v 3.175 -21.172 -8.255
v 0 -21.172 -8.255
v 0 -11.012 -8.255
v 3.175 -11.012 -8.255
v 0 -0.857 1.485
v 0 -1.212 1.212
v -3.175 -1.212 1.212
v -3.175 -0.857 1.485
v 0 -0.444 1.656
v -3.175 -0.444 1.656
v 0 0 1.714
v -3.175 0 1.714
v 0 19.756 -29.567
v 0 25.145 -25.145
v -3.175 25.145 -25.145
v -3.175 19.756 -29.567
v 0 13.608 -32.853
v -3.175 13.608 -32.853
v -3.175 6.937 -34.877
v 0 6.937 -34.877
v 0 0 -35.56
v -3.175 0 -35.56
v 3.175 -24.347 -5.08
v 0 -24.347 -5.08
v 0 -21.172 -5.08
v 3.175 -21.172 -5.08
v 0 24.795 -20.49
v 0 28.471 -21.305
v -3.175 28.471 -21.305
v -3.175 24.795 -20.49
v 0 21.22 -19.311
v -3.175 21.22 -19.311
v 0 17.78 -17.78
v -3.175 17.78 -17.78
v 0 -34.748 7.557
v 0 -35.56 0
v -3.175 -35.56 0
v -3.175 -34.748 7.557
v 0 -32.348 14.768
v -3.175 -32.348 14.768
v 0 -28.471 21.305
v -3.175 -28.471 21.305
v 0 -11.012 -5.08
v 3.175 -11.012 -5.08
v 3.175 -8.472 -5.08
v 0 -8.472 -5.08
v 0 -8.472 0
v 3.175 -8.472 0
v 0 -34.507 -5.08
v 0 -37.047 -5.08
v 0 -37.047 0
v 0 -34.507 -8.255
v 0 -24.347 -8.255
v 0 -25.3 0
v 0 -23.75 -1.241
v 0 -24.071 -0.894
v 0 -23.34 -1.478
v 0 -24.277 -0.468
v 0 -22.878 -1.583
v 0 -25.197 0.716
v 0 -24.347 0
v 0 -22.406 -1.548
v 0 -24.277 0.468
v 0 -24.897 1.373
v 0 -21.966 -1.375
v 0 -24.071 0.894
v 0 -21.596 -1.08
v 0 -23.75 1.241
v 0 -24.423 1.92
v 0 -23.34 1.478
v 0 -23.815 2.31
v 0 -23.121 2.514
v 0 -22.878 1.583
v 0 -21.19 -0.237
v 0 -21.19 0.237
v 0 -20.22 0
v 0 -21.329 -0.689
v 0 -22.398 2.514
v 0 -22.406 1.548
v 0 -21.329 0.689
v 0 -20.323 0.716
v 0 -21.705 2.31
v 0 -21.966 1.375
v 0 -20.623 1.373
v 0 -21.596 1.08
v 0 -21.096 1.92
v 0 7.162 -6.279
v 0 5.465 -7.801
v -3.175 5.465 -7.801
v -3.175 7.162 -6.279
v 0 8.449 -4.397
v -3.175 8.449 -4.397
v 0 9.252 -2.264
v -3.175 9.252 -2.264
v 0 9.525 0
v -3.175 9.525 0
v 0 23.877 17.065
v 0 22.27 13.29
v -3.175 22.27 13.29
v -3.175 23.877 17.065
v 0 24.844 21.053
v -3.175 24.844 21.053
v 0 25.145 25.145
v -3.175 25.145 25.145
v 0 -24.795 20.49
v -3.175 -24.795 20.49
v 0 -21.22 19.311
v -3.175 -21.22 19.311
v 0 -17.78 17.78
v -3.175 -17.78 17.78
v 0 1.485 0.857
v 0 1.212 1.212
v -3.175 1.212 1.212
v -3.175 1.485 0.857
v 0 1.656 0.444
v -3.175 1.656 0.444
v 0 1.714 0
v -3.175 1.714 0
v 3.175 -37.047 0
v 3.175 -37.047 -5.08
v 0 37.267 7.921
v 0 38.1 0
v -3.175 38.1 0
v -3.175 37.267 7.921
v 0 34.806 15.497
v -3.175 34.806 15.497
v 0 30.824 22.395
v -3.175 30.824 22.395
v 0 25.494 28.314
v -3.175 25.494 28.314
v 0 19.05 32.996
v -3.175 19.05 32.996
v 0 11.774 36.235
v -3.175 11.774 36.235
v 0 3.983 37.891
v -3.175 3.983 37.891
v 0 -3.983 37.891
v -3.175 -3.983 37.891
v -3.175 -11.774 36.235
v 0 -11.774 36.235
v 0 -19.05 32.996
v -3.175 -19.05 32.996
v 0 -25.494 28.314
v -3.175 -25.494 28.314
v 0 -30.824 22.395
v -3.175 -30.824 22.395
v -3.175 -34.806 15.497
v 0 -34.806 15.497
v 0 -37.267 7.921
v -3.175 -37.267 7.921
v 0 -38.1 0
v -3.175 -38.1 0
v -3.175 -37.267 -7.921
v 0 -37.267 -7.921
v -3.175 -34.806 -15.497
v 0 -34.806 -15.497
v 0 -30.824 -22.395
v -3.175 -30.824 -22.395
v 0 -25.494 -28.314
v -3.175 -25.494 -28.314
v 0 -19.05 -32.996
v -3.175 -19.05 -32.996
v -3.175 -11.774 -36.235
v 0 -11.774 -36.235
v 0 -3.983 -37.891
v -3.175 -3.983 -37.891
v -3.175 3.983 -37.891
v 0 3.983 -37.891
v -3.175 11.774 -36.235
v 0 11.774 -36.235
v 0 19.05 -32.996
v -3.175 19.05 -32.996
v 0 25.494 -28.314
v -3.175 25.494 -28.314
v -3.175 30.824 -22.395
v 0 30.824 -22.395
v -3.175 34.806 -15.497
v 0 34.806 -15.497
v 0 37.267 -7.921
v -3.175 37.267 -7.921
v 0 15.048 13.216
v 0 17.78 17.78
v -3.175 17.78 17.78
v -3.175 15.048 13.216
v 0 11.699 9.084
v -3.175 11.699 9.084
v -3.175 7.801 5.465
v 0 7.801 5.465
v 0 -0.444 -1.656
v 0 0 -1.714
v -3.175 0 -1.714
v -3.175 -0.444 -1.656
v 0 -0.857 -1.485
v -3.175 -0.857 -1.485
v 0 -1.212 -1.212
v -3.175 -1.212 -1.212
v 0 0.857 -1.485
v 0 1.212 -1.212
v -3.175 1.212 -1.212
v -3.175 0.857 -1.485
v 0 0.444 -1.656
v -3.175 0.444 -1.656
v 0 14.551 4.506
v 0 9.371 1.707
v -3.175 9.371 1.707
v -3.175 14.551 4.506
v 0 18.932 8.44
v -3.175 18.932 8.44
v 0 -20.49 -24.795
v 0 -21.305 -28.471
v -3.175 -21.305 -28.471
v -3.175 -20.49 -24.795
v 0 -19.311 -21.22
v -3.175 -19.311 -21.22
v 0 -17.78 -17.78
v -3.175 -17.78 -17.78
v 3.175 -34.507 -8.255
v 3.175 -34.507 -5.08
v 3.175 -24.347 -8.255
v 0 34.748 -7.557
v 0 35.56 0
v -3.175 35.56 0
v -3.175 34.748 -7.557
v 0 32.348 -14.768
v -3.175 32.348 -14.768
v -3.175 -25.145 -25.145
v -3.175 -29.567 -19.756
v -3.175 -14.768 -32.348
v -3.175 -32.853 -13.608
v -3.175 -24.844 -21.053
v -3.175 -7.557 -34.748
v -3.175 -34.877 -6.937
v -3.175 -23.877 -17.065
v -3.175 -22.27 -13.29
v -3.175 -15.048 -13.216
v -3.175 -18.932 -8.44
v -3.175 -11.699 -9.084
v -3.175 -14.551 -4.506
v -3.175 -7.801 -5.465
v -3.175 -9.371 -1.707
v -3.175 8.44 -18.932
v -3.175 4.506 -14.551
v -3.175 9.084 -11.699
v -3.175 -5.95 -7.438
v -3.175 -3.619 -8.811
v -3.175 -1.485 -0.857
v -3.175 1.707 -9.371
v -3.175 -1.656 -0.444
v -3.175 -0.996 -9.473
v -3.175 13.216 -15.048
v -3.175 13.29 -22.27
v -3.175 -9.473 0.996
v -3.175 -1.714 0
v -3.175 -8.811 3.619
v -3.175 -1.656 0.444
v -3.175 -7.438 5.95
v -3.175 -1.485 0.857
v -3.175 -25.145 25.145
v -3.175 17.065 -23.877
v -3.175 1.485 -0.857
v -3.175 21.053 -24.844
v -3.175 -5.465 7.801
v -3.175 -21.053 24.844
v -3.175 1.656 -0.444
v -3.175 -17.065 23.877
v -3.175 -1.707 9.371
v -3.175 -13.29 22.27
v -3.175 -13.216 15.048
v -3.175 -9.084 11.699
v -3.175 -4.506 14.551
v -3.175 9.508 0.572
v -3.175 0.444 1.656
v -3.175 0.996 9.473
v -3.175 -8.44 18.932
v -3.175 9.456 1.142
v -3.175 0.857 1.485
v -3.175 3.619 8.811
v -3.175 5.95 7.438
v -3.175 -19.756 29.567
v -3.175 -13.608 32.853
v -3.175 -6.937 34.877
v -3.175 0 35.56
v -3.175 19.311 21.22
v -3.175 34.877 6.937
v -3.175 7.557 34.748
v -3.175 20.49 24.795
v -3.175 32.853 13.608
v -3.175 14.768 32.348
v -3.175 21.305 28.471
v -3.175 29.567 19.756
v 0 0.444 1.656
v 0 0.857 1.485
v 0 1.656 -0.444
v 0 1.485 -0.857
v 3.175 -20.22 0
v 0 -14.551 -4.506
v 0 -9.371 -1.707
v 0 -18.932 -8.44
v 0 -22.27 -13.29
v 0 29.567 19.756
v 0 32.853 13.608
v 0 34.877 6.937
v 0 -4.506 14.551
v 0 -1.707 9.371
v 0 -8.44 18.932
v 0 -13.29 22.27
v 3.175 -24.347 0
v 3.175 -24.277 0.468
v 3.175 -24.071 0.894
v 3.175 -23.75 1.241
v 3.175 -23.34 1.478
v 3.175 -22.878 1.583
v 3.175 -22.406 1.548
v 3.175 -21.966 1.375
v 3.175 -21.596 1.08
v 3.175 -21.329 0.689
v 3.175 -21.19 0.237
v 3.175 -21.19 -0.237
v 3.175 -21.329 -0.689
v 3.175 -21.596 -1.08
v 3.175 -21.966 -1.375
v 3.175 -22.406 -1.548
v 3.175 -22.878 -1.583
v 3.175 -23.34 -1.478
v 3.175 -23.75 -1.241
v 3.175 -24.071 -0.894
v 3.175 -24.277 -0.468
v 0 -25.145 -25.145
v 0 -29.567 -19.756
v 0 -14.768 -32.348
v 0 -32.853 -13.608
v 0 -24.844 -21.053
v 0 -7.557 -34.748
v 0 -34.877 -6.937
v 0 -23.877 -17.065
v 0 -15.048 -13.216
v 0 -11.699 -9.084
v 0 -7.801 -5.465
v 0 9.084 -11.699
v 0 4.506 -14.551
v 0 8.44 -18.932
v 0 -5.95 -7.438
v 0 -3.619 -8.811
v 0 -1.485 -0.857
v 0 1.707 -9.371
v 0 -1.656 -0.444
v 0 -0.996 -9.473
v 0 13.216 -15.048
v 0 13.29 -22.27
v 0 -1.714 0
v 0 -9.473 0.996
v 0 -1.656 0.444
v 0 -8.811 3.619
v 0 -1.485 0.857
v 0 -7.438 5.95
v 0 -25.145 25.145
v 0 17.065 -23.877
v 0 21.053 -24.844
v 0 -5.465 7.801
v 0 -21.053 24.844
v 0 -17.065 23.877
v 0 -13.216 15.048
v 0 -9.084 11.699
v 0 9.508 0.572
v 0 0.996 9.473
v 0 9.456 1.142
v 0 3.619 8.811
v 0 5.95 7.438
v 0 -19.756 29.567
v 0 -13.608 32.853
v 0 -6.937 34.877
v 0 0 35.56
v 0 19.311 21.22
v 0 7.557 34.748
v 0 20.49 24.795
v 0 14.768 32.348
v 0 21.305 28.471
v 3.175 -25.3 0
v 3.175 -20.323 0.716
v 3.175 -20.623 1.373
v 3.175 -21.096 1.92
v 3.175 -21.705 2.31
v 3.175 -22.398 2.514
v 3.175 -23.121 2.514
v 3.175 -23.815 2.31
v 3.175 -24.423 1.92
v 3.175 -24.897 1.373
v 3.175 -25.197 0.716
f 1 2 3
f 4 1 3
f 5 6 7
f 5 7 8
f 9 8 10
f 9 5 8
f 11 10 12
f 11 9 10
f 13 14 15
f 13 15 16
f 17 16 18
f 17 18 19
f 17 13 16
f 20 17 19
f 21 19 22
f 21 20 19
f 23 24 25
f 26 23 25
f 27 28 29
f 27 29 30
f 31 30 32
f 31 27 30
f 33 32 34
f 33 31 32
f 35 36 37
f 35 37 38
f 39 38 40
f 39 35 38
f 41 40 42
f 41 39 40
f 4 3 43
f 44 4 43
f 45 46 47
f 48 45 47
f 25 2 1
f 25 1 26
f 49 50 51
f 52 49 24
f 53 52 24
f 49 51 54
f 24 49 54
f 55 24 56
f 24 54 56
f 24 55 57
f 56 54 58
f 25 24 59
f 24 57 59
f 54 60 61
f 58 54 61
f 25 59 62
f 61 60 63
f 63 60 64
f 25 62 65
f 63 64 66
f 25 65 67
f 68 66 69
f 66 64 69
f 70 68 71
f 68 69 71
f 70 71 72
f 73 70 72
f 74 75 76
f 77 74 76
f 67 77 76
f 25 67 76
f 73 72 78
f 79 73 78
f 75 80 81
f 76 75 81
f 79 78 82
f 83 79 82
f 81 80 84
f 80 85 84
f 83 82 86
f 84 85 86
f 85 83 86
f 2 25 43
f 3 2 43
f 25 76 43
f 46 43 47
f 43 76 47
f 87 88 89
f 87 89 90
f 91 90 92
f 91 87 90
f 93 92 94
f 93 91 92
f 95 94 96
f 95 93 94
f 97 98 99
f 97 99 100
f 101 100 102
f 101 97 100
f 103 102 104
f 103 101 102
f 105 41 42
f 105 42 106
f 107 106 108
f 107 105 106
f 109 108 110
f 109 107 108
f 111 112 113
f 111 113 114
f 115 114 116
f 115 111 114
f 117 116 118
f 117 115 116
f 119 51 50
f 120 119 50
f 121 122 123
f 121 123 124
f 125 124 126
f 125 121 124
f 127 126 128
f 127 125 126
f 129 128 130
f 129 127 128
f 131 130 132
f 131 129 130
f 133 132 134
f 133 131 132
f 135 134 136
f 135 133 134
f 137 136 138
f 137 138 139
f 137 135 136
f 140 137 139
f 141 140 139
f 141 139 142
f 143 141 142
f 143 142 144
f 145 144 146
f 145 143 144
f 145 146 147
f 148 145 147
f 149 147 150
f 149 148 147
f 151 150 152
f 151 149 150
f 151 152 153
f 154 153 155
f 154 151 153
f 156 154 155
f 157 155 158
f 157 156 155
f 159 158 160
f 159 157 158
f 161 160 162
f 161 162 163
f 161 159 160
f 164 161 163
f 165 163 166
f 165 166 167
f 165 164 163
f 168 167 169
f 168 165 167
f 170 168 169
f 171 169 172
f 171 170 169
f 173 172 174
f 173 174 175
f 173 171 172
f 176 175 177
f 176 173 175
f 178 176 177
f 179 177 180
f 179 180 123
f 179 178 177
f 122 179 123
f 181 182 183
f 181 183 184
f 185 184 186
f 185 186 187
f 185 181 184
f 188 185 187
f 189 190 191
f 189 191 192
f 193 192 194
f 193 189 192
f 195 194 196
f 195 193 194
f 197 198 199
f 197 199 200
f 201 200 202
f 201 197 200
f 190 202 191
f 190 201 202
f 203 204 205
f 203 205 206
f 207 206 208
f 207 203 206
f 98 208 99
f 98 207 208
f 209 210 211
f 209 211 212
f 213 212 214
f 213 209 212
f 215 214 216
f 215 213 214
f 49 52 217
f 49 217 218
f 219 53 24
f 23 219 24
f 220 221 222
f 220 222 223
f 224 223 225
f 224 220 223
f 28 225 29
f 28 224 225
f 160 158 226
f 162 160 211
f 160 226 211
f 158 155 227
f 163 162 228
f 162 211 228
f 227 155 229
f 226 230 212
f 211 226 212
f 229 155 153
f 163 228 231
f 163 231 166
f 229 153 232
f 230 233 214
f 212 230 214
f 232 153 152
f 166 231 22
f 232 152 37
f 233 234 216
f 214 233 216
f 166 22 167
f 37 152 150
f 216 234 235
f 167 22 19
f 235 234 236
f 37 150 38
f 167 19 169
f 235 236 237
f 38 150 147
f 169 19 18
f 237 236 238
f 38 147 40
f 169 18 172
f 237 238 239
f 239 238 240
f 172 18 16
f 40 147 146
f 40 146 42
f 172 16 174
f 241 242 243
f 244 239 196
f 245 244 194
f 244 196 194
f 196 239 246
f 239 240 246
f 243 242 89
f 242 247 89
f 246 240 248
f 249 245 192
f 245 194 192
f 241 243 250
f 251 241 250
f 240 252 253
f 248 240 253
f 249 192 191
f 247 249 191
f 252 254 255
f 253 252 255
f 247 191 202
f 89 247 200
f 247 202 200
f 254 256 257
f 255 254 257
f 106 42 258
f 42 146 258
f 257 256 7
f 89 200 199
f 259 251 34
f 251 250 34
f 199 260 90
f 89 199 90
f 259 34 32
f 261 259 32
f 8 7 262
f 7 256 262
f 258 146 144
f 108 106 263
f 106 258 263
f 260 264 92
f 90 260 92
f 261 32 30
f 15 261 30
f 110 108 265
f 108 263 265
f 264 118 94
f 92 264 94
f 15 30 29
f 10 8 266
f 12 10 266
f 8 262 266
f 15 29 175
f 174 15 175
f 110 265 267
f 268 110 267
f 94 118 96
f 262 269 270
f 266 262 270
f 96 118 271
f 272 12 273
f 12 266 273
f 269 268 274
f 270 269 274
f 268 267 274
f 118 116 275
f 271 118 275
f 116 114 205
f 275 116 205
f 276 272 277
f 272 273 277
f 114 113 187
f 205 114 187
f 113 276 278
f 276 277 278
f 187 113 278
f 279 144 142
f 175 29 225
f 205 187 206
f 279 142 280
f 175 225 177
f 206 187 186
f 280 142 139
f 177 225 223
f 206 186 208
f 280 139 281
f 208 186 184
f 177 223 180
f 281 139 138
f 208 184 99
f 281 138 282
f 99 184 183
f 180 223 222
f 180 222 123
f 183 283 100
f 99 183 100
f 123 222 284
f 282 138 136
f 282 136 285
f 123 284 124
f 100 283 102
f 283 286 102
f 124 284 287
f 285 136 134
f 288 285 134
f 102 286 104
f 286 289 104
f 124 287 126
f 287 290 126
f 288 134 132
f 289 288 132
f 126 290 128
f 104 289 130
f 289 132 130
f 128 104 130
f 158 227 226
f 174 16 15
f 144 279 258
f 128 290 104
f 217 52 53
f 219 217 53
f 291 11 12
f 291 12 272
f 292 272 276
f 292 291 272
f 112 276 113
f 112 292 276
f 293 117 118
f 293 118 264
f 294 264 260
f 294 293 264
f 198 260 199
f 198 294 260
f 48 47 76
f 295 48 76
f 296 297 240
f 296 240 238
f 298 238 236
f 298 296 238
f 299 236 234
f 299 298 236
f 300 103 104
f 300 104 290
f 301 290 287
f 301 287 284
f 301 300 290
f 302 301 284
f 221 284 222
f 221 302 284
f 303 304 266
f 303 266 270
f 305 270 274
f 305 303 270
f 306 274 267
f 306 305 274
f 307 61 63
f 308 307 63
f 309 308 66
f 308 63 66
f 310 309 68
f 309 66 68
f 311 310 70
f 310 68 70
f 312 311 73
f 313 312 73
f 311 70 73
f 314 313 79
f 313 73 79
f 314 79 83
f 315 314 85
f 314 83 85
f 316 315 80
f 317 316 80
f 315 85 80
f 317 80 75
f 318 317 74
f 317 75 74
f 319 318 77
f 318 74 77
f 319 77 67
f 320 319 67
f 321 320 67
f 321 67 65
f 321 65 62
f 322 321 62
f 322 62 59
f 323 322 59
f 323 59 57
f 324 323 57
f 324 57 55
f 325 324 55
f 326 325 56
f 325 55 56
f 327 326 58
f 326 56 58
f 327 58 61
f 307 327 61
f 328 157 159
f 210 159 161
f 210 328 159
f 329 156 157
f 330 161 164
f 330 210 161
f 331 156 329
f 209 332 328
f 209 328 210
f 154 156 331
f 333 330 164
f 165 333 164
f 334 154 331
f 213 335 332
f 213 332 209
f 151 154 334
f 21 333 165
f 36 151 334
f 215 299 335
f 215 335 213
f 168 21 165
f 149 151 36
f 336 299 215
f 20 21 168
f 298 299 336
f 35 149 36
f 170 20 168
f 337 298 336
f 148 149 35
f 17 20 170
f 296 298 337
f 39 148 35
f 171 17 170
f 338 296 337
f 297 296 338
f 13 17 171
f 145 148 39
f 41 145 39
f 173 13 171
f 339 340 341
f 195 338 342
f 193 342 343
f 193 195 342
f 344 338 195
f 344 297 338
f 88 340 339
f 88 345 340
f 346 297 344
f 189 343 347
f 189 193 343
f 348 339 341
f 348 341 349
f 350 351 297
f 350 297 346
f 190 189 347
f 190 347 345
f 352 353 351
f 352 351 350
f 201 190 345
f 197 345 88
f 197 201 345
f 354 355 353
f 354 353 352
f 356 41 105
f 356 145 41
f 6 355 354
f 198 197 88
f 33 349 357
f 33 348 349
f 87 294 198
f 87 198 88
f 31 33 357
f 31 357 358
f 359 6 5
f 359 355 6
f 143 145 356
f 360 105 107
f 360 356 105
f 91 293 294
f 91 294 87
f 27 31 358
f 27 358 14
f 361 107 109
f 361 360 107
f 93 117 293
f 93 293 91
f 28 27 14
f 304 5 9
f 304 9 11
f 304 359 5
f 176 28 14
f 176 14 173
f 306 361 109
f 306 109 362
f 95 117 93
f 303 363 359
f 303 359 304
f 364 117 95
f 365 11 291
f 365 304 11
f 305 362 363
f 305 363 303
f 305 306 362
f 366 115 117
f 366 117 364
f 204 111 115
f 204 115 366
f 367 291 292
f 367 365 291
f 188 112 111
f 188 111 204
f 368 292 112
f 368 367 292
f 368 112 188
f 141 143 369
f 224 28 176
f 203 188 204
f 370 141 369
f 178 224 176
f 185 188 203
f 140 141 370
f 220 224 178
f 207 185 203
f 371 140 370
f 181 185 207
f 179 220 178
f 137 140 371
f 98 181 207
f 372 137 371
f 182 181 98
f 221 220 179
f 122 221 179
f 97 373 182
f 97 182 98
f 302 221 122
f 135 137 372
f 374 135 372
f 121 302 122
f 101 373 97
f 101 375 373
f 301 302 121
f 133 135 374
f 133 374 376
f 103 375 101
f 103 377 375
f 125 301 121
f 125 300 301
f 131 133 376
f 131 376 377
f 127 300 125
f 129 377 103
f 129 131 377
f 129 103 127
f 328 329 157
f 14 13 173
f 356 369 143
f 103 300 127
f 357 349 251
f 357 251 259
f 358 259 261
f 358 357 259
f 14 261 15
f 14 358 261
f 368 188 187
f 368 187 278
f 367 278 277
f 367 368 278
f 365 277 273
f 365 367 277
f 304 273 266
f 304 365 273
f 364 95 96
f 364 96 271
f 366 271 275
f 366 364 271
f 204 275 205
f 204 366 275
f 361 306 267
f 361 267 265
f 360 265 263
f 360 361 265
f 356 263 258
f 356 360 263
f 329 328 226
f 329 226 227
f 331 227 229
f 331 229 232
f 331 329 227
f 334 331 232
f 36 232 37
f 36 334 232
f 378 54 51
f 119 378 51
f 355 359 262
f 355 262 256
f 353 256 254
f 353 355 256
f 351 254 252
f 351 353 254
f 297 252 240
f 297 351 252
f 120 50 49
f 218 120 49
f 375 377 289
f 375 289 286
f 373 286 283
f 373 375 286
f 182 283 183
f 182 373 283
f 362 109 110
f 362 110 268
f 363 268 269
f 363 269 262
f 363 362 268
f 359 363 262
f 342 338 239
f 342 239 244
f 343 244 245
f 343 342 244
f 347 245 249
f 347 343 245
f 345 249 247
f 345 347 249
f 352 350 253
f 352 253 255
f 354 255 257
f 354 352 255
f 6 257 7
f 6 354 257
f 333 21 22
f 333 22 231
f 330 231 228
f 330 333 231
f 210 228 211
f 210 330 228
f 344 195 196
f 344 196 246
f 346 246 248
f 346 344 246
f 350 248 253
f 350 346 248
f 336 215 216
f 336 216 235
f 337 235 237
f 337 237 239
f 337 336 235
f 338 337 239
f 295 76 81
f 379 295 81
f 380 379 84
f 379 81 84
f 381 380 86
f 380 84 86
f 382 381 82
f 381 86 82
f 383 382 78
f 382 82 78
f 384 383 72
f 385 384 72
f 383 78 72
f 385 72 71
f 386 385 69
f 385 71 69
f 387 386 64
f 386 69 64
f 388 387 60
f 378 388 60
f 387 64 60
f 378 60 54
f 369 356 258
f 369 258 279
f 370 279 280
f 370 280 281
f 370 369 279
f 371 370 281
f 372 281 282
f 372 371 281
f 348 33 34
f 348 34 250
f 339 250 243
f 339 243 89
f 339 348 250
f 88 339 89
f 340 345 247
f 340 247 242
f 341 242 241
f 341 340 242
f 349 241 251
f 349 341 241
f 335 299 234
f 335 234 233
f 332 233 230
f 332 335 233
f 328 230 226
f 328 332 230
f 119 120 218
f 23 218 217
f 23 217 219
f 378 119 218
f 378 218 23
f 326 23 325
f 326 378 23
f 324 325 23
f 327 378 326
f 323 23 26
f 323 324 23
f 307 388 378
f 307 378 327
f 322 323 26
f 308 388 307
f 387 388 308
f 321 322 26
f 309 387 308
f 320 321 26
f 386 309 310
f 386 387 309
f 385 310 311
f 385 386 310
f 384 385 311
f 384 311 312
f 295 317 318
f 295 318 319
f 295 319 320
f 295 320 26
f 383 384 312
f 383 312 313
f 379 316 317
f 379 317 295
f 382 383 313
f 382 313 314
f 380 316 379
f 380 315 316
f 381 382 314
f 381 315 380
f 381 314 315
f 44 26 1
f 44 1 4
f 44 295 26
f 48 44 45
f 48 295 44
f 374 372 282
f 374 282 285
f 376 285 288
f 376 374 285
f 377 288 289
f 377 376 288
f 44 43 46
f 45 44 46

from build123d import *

# Parameters (mm, degrees)
F0_W     = 10.16
F0_H     = 3.175
F1_DEPTH = 3.175
F2_R     = 38.1
F3_DEPTH = 3.175


with BuildPart() as f1:
    # F0 (on Right) → F1 (new body)
    with BuildSketch(Plane.YZ):
        with BuildLine():
            Line((-37.0472365969, -5.08), (-34.5072365969, -5.08))
            Line((-34.5072365969, -5.08), (-24.3472365969, -5.08))
            Line((-24.3472365969, -5.08), (-21.1722365969, -5.08))
            Line((-21.1722365969, -5.08), (-11.0122365969, -5.08))
            Line((-11.0122365969, -5.08), (-8.4722365969, -5.08))
            Line((-8.4722365969, -5.08), (-8.4722365969, 0))
            Line((-8.4722365969, 0), (-20.2197365969, 0))
            ThreePointArc((-20.2197365969, 0), (-22.7597365969, -2.54), (-25.2997365969, 0))
            Line((-25.2997365969, 0), (-37.0472365969, 0))
            Line((-37.0472365969, 0), (-37.0472365969, -5.08))
        make_face()
        with Locations((-29.4272365969, -6.6675)):
            Rectangle(F0_W, F0_H)
        with Locations((-16.0922365969, -6.6675)):
            Rectangle(F0_W, F0_H)
        with BuildLine():
            Line((-24.3472365969, 0), (-25.2997365969, 0))
            ThreePointArc((-25.2997365969, 0), (-22.7597365969, -2.54), (-20.2197365969, 0))
            Line((-20.2197365969, 0), (-21.1722365969, 0))
            ThreePointArc((-21.1722365969, 0), (-22.7597365969, -1.5875), (-24.3472365969, 0))
        make_face()
        with BuildLine():
            ThreePointArc((-20.2197365969, 0), (-22.7597365969, 2.54), (-25.2997365969, 0))
            Line((-25.2997365969, 0), (-24.3472365969, 0))
            ThreePointArc((-24.3472365969, 0), (-22.7597365969, 1.5875), (-21.1722365969, 0))
            Line((-21.1722365969, 0), (-20.2197365969, 0))
        make_face()
    extrude(amount=F1_DEPTH)


with BuildPart() as f3:
    # F2 (on Right) → F3 (new body)
    with BuildSketch(Plane.YZ):
        Circle(F2_R)
        with BuildLine():
            ThreePointArc((25.144717139, 25.144717139), (32.8531561761, 13.6082228549), (35.56, 0))
            ThreePointArc((35.56, 0), (33.7412558495, -11.2268095956), (28.4710655964, -21.305211189))
            ThreePointArc((28.4710655964, -21.305211189), (26.87654165, -23.2844392016), (25.144717139, -25.144717139))
            ThreePointArc((25.144717139, -25.144717139), (13.6082228549, -32.8531561761), (0, -35.56))
            ThreePointArc((0, -35.56), (-11.2268095956, -33.7412558495), (-21.305211189, -28.4710655964))
            ThreePointArc((-21.305211189, -28.4710655964), (-23.2844392016, -26.87654165), (-25.144717139, -25.144717139))
            ThreePointArc((-25.144717139, -25.144717139), (-32.8531561761, -13.6082228549), (-35.56, 0))
            ThreePointArc((-35.56, 0), (-33.7412558495, 11.2268095956), (-28.4710655964, 21.305211189))
            ThreePointArc((-28.4710655964, 21.305211189), (-26.87654165, 23.2844392016), (-25.144717139, 25.144717139))
            ThreePointArc((-25.144717139, 25.144717139), (-13.6082228549, 32.8531561761), (0, 35.56))
            ThreePointArc((0, 35.56), (11.2268095956, 33.7412558495), (21.305211189, 28.4710655964))
            ThreePointArc((21.305211189, 28.4710655964), (23.2844392016, 26.87654165), (25.144717139, 25.144717139))
        make_face(mode=Mode.SUBTRACT)
        with BuildLine():
            ThreePointArc((7.8013674913, 5.4648229858), (8.7891665031, 3.6709913076), (9.3707069317, 1.7074766763))
            ThreePointArc((9.3707069317, 1.7074766763), (16.8578110254, 6.3433195038), (22.2701280605, 13.2898719395))
            Line((22.2701280605, 13.2898719395), (17.78, 17.78))
            ThreePointArc((17.78, 17.78), (13.4466886732, 11.0908696329), (7.8013674913, 5.4648229858))
        make_face()
        with BuildLine():
            ThreePointArc((17.78, -17.78), (11.0908696329, -13.4466886732), (5.4648229858, -7.8013674913))
            ThreePointArc((5.4648229858, -7.8013674913), (3.6709913076, -8.7891665031), (1.7074766763, -9.3707069317))
            ThreePointArc((1.7074766763, -9.3707069317), (6.3433195038, -16.8578110254), (13.2898719395, -22.2701280605))
            Line((13.2898719395, -22.2701280605), (17.78, -17.78))
        make_face()
        with BuildLine():
            ThreePointArc((-17.78, -17.78), (-13.4466886732, -11.0908696329), (-7.8013674913, -5.4648229858))
            ThreePointArc((-7.8013674913, -5.4648229858), (-8.7891665031, -3.6709913076), (-9.3707069317, -1.7074766763))
            ThreePointArc((-9.3707069317, -1.7074766763), (-16.8578110254, -6.3433195038), (-22.2701280605, -13.2898719395))
            Line((-22.2701280605, -13.2898719395), (-17.78, -17.78))
        make_face()
        with BuildLine():
            ThreePointArc((-5.4648229858, 7.8013674913), (-3.6709913076, 8.7891665031), (-1.7074766763, 9.3707069317))
            ThreePointArc((-1.7074766763, 9.3707069317), (-6.3433195038, 16.8578110254), (-13.2898719395, 22.2701280605))
            Line((-13.2898719395, 22.2701280605), (-17.78, 17.78))
            ThreePointArc((-17.78, 17.78), (-11.0908696329, 13.4466886732), (-5.4648229858, 7.8013674913))
        make_face()
        with BuildLine():
            ThreePointArc((-9.3707069317, -1.7074766763), (-5.6100693847, -0.5512258396), (-1.7145, 0))
            ThreePointArc((-1.7145, 0), (-1.5839914585, 0.6561107448), (-1.2123345763, 1.2123345763))
            ThreePointArc((-1.2123345763, 1.2123345763), (-3.166406309, 4.6179692284), (-5.4648229858, 7.8013674913))
            ThreePointArc((-5.4648229858, 7.8013674913), (-8.8106620826, 3.619096388), (-9.3707069317, -1.7074766763))
        make_face()
        with BuildLine():
            ThreePointArc((0, 1.7145), (0.6561107448, 1.5839914585), (1.2123345763, 1.2123345763))
            ThreePointArc((1.2123345763, 1.2123345763), (4.6179692284, 3.166406309), (7.8013674913, 5.4648229858))
            ThreePointArc((7.8013674913, 5.4648229858), (3.619096388, 8.8106620826), (-1.7074766763, 9.3707069317))
            ThreePointArc((-1.7074766763, 9.3707069317), (-0.5512258396, 5.6100693847), (0, 1.7145))
        make_face()
        with BuildLine():
            ThreePointArc((9.3707069317, 1.7074766763), (5.6100693847, 0.5512258396), (1.7145, 0))
            ThreePointArc((1.7145, 0), (1.5839914585, -0.6561107448), (1.2123345763, -1.2123345763))
            ThreePointArc((1.2123345763, -1.2123345763), (3.166406309, -4.6179692284), (5.4648229858, -7.8013674913))
            ThreePointArc((5.4648229858, -7.8013674913), (8.4492030376, -4.3973393126), (9.525, 0))
            ThreePointArc((9.525, 0), (9.4863483102, 0.8572168557), (9.3707069317, 1.7074766763))
        make_face()
        with BuildLine():
            ThreePointArc((1.7074766763, -9.3707069317), (0.5512258396, -5.6100693847), (0, -1.7145))
            ThreePointArc((0, -1.7145), (-0.6561107448, -1.5839914585), (-1.2123345763, -1.2123345763))
            ThreePointArc((-1.2123345763, -1.2123345763), (-4.6179692284, -3.166406309), (-7.8013674913, -5.4648229858))
            ThreePointArc((-7.8013674913, -5.4648229858), (-3.619096388, -8.8106620826), (1.7074766763, -9.3707069317))
        make_face()
        with BuildLine():
            Line((17.78, 17.78), (22.2701280605, 13.2898719395))
            ThreePointArc((22.2701280605, 13.2898719395), (24.4424397534, 19.0390659545), (25.144717139, 25.144717139))
            Line((25.144717139, 25.144717139), (17.78, 17.78))
        make_face()
        with BuildLine():
            Line((25.144717139, -25.144717139), (17.78, -17.78))
            Line((17.78, -17.78), (13.2898719395, -22.2701280605))
            ThreePointArc((13.2898719395, -22.2701280605), (19.0390659545, -24.4424397534), (25.144717139, -25.144717139))
        make_face()
        with BuildLine():
            Line((-25.144717139, -25.144717139), (-17.78, -17.78))
            Line((-17.78, -17.78), (-22.2701280605, -13.2898719395))
            ThreePointArc((-22.2701280605, -13.2898719395), (-24.4424397534, -19.0390659545), (-25.144717139, -25.144717139))
        make_face()
        with BuildLine():
            Line((-17.78, 17.78), (-13.2898719395, 22.2701280605))
            ThreePointArc((-13.2898719395, 22.2701280605), (-19.0390659545, 24.4424397534), (-25.144717139, 25.144717139))
            Line((-25.144717139, 25.144717139), (-17.78, 17.78))
        make_face()
        with BuildLine():
            ThreePointArc((21.305211189, 28.4710655964), (19.9447933347, 22.9929176992), (17.78, 17.78))
            Line((17.78, 17.78), (25.144717139, 25.144717139))
            Line((25.144717139, 25.144717139), (21.305211189, 28.4710655964))
        make_face()
        with BuildLine():
            ThreePointArc((28.4710655964, -21.305211189), (22.9929176992, -19.9447933347), (17.78, -17.78))
            Line((17.78, -17.78), (25.144717139, -25.144717139))
            Line((25.144717139, -25.144717139), (28.4710655964, -21.305211189))
        make_face()
        with BuildLine():
            ThreePointArc((-21.305211189, -28.4710655964), (-19.9447933347, -22.9929176992), (-17.78, -17.78))
            Line((-17.78, -17.78), (-25.144717139, -25.144717139))
            Line((-25.144717139, -25.144717139), (-21.305211189, -28.4710655964))
        make_face()
        with BuildLine():
            ThreePointArc((-28.4710655964, 21.305211189), (-22.9929176992, 19.9447933347), (-17.78, 17.78))
            Line((-17.78, 17.78), (-25.144717139, 25.144717139))
            Line((-25.144717139, 25.144717139), (-28.4710655964, 21.305211189))
        make_face()
        with BuildLine():
            ThreePointArc((-1.2123345763, 1.2123345763), (-0.6561107448, 1.5839914585), (0, 1.7145))
            ThreePointArc((0, 1.7145), (-0.5512258396, 5.6100693847), (-1.7074766763, 9.3707069317))
            ThreePointArc((-1.7074766763, 9.3707069317), (-3.6709913076, 8.7891665031), (-5.4648229858, 7.8013674913))
            ThreePointArc((-5.4648229858, 7.8013674913), (-3.166406309, 4.6179692284), (-1.2123345763, 1.2123345763))
        make_face()
        with BuildLine():
            ThreePointArc((1.2123345763, 1.2123345763), (1.5839914585, 0.6561107448), (1.7145, 0))
            ThreePointArc((1.7145, 0), (5.6100693847, 0.5512258396), (9.3707069317, 1.7074766763))
            ThreePointArc((9.3707069317, 1.7074766763), (8.7891665031, 3.6709913076), (7.8013674913, 5.4648229858))
            ThreePointArc((7.8013674913, 5.4648229858), (4.6179692284, 3.166406309), (1.2123345763, 1.2123345763))
        make_face()
        with BuildLine():
            ThreePointArc((5.4648229858, -7.8013674913), (3.166406309, -4.6179692284), (1.2123345763, -1.2123345763))
            ThreePointArc((1.2123345763, -1.2123345763), (0.6561107448, -1.5839914585), (0, -1.7145))
            ThreePointArc((0, -1.7145), (0.5512258396, -5.6100693847), (1.7074766763, -9.3707069317))
            ThreePointArc((1.7074766763, -9.3707069317), (3.6709913076, -8.7891665031), (5.4648229858, -7.8013674913))
        make_face()
        with BuildLine():
            ThreePointArc((-7.8013674913, -5.4648229858), (-4.6179692284, -3.166406309), (-1.2123345763, -1.2123345763))
            ThreePointArc((-1.2123345763, -1.2123345763), (-1.5839914585, -0.6561107448), (-1.7145, 0))
            ThreePointArc((-1.7145, 0), (-5.6100693847, -0.5512258396), (-9.3707069317, -1.7074766763))
            ThreePointArc((-9.3707069317, -1.7074766763), (-8.7891665031, -3.6709913076), (-7.8013674913, -5.4648229858))
        make_face()
        with BuildLine():
            Line((-28.4710655964, 21.305211189), (-25.144717139, 25.144717139))
            ThreePointArc((-25.144717139, 25.144717139), (-26.87654165, 23.2844392016), (-28.4710655964, 21.305211189))
        make_face()
        with BuildLine():
            Line((21.305211189, 28.4710655964), (25.144717139, 25.144717139))
            ThreePointArc((25.144717139, 25.144717139), (23.2844392016, 26.87654165), (21.305211189, 28.4710655964))
        make_face()
        with BuildLine():
            Line((28.4710655964, -21.305211189), (25.144717139, -25.144717139))
            ThreePointArc((25.144717139, -25.144717139), (26.87654165, -23.2844392016), (28.4710655964, -21.305211189))
        make_face()
        with BuildLine():
            Line((-21.305211189, -28.4710655964), (-25.144717139, -25.144717139))
            ThreePointArc((-25.144717139, -25.144717139), (-23.2844392016, -26.87654165), (-21.305211189, -28.4710655964))
        make_face()
    extrude(amount=-F3_DEPTH)


solid = Compound([f1.part, f3.part])
